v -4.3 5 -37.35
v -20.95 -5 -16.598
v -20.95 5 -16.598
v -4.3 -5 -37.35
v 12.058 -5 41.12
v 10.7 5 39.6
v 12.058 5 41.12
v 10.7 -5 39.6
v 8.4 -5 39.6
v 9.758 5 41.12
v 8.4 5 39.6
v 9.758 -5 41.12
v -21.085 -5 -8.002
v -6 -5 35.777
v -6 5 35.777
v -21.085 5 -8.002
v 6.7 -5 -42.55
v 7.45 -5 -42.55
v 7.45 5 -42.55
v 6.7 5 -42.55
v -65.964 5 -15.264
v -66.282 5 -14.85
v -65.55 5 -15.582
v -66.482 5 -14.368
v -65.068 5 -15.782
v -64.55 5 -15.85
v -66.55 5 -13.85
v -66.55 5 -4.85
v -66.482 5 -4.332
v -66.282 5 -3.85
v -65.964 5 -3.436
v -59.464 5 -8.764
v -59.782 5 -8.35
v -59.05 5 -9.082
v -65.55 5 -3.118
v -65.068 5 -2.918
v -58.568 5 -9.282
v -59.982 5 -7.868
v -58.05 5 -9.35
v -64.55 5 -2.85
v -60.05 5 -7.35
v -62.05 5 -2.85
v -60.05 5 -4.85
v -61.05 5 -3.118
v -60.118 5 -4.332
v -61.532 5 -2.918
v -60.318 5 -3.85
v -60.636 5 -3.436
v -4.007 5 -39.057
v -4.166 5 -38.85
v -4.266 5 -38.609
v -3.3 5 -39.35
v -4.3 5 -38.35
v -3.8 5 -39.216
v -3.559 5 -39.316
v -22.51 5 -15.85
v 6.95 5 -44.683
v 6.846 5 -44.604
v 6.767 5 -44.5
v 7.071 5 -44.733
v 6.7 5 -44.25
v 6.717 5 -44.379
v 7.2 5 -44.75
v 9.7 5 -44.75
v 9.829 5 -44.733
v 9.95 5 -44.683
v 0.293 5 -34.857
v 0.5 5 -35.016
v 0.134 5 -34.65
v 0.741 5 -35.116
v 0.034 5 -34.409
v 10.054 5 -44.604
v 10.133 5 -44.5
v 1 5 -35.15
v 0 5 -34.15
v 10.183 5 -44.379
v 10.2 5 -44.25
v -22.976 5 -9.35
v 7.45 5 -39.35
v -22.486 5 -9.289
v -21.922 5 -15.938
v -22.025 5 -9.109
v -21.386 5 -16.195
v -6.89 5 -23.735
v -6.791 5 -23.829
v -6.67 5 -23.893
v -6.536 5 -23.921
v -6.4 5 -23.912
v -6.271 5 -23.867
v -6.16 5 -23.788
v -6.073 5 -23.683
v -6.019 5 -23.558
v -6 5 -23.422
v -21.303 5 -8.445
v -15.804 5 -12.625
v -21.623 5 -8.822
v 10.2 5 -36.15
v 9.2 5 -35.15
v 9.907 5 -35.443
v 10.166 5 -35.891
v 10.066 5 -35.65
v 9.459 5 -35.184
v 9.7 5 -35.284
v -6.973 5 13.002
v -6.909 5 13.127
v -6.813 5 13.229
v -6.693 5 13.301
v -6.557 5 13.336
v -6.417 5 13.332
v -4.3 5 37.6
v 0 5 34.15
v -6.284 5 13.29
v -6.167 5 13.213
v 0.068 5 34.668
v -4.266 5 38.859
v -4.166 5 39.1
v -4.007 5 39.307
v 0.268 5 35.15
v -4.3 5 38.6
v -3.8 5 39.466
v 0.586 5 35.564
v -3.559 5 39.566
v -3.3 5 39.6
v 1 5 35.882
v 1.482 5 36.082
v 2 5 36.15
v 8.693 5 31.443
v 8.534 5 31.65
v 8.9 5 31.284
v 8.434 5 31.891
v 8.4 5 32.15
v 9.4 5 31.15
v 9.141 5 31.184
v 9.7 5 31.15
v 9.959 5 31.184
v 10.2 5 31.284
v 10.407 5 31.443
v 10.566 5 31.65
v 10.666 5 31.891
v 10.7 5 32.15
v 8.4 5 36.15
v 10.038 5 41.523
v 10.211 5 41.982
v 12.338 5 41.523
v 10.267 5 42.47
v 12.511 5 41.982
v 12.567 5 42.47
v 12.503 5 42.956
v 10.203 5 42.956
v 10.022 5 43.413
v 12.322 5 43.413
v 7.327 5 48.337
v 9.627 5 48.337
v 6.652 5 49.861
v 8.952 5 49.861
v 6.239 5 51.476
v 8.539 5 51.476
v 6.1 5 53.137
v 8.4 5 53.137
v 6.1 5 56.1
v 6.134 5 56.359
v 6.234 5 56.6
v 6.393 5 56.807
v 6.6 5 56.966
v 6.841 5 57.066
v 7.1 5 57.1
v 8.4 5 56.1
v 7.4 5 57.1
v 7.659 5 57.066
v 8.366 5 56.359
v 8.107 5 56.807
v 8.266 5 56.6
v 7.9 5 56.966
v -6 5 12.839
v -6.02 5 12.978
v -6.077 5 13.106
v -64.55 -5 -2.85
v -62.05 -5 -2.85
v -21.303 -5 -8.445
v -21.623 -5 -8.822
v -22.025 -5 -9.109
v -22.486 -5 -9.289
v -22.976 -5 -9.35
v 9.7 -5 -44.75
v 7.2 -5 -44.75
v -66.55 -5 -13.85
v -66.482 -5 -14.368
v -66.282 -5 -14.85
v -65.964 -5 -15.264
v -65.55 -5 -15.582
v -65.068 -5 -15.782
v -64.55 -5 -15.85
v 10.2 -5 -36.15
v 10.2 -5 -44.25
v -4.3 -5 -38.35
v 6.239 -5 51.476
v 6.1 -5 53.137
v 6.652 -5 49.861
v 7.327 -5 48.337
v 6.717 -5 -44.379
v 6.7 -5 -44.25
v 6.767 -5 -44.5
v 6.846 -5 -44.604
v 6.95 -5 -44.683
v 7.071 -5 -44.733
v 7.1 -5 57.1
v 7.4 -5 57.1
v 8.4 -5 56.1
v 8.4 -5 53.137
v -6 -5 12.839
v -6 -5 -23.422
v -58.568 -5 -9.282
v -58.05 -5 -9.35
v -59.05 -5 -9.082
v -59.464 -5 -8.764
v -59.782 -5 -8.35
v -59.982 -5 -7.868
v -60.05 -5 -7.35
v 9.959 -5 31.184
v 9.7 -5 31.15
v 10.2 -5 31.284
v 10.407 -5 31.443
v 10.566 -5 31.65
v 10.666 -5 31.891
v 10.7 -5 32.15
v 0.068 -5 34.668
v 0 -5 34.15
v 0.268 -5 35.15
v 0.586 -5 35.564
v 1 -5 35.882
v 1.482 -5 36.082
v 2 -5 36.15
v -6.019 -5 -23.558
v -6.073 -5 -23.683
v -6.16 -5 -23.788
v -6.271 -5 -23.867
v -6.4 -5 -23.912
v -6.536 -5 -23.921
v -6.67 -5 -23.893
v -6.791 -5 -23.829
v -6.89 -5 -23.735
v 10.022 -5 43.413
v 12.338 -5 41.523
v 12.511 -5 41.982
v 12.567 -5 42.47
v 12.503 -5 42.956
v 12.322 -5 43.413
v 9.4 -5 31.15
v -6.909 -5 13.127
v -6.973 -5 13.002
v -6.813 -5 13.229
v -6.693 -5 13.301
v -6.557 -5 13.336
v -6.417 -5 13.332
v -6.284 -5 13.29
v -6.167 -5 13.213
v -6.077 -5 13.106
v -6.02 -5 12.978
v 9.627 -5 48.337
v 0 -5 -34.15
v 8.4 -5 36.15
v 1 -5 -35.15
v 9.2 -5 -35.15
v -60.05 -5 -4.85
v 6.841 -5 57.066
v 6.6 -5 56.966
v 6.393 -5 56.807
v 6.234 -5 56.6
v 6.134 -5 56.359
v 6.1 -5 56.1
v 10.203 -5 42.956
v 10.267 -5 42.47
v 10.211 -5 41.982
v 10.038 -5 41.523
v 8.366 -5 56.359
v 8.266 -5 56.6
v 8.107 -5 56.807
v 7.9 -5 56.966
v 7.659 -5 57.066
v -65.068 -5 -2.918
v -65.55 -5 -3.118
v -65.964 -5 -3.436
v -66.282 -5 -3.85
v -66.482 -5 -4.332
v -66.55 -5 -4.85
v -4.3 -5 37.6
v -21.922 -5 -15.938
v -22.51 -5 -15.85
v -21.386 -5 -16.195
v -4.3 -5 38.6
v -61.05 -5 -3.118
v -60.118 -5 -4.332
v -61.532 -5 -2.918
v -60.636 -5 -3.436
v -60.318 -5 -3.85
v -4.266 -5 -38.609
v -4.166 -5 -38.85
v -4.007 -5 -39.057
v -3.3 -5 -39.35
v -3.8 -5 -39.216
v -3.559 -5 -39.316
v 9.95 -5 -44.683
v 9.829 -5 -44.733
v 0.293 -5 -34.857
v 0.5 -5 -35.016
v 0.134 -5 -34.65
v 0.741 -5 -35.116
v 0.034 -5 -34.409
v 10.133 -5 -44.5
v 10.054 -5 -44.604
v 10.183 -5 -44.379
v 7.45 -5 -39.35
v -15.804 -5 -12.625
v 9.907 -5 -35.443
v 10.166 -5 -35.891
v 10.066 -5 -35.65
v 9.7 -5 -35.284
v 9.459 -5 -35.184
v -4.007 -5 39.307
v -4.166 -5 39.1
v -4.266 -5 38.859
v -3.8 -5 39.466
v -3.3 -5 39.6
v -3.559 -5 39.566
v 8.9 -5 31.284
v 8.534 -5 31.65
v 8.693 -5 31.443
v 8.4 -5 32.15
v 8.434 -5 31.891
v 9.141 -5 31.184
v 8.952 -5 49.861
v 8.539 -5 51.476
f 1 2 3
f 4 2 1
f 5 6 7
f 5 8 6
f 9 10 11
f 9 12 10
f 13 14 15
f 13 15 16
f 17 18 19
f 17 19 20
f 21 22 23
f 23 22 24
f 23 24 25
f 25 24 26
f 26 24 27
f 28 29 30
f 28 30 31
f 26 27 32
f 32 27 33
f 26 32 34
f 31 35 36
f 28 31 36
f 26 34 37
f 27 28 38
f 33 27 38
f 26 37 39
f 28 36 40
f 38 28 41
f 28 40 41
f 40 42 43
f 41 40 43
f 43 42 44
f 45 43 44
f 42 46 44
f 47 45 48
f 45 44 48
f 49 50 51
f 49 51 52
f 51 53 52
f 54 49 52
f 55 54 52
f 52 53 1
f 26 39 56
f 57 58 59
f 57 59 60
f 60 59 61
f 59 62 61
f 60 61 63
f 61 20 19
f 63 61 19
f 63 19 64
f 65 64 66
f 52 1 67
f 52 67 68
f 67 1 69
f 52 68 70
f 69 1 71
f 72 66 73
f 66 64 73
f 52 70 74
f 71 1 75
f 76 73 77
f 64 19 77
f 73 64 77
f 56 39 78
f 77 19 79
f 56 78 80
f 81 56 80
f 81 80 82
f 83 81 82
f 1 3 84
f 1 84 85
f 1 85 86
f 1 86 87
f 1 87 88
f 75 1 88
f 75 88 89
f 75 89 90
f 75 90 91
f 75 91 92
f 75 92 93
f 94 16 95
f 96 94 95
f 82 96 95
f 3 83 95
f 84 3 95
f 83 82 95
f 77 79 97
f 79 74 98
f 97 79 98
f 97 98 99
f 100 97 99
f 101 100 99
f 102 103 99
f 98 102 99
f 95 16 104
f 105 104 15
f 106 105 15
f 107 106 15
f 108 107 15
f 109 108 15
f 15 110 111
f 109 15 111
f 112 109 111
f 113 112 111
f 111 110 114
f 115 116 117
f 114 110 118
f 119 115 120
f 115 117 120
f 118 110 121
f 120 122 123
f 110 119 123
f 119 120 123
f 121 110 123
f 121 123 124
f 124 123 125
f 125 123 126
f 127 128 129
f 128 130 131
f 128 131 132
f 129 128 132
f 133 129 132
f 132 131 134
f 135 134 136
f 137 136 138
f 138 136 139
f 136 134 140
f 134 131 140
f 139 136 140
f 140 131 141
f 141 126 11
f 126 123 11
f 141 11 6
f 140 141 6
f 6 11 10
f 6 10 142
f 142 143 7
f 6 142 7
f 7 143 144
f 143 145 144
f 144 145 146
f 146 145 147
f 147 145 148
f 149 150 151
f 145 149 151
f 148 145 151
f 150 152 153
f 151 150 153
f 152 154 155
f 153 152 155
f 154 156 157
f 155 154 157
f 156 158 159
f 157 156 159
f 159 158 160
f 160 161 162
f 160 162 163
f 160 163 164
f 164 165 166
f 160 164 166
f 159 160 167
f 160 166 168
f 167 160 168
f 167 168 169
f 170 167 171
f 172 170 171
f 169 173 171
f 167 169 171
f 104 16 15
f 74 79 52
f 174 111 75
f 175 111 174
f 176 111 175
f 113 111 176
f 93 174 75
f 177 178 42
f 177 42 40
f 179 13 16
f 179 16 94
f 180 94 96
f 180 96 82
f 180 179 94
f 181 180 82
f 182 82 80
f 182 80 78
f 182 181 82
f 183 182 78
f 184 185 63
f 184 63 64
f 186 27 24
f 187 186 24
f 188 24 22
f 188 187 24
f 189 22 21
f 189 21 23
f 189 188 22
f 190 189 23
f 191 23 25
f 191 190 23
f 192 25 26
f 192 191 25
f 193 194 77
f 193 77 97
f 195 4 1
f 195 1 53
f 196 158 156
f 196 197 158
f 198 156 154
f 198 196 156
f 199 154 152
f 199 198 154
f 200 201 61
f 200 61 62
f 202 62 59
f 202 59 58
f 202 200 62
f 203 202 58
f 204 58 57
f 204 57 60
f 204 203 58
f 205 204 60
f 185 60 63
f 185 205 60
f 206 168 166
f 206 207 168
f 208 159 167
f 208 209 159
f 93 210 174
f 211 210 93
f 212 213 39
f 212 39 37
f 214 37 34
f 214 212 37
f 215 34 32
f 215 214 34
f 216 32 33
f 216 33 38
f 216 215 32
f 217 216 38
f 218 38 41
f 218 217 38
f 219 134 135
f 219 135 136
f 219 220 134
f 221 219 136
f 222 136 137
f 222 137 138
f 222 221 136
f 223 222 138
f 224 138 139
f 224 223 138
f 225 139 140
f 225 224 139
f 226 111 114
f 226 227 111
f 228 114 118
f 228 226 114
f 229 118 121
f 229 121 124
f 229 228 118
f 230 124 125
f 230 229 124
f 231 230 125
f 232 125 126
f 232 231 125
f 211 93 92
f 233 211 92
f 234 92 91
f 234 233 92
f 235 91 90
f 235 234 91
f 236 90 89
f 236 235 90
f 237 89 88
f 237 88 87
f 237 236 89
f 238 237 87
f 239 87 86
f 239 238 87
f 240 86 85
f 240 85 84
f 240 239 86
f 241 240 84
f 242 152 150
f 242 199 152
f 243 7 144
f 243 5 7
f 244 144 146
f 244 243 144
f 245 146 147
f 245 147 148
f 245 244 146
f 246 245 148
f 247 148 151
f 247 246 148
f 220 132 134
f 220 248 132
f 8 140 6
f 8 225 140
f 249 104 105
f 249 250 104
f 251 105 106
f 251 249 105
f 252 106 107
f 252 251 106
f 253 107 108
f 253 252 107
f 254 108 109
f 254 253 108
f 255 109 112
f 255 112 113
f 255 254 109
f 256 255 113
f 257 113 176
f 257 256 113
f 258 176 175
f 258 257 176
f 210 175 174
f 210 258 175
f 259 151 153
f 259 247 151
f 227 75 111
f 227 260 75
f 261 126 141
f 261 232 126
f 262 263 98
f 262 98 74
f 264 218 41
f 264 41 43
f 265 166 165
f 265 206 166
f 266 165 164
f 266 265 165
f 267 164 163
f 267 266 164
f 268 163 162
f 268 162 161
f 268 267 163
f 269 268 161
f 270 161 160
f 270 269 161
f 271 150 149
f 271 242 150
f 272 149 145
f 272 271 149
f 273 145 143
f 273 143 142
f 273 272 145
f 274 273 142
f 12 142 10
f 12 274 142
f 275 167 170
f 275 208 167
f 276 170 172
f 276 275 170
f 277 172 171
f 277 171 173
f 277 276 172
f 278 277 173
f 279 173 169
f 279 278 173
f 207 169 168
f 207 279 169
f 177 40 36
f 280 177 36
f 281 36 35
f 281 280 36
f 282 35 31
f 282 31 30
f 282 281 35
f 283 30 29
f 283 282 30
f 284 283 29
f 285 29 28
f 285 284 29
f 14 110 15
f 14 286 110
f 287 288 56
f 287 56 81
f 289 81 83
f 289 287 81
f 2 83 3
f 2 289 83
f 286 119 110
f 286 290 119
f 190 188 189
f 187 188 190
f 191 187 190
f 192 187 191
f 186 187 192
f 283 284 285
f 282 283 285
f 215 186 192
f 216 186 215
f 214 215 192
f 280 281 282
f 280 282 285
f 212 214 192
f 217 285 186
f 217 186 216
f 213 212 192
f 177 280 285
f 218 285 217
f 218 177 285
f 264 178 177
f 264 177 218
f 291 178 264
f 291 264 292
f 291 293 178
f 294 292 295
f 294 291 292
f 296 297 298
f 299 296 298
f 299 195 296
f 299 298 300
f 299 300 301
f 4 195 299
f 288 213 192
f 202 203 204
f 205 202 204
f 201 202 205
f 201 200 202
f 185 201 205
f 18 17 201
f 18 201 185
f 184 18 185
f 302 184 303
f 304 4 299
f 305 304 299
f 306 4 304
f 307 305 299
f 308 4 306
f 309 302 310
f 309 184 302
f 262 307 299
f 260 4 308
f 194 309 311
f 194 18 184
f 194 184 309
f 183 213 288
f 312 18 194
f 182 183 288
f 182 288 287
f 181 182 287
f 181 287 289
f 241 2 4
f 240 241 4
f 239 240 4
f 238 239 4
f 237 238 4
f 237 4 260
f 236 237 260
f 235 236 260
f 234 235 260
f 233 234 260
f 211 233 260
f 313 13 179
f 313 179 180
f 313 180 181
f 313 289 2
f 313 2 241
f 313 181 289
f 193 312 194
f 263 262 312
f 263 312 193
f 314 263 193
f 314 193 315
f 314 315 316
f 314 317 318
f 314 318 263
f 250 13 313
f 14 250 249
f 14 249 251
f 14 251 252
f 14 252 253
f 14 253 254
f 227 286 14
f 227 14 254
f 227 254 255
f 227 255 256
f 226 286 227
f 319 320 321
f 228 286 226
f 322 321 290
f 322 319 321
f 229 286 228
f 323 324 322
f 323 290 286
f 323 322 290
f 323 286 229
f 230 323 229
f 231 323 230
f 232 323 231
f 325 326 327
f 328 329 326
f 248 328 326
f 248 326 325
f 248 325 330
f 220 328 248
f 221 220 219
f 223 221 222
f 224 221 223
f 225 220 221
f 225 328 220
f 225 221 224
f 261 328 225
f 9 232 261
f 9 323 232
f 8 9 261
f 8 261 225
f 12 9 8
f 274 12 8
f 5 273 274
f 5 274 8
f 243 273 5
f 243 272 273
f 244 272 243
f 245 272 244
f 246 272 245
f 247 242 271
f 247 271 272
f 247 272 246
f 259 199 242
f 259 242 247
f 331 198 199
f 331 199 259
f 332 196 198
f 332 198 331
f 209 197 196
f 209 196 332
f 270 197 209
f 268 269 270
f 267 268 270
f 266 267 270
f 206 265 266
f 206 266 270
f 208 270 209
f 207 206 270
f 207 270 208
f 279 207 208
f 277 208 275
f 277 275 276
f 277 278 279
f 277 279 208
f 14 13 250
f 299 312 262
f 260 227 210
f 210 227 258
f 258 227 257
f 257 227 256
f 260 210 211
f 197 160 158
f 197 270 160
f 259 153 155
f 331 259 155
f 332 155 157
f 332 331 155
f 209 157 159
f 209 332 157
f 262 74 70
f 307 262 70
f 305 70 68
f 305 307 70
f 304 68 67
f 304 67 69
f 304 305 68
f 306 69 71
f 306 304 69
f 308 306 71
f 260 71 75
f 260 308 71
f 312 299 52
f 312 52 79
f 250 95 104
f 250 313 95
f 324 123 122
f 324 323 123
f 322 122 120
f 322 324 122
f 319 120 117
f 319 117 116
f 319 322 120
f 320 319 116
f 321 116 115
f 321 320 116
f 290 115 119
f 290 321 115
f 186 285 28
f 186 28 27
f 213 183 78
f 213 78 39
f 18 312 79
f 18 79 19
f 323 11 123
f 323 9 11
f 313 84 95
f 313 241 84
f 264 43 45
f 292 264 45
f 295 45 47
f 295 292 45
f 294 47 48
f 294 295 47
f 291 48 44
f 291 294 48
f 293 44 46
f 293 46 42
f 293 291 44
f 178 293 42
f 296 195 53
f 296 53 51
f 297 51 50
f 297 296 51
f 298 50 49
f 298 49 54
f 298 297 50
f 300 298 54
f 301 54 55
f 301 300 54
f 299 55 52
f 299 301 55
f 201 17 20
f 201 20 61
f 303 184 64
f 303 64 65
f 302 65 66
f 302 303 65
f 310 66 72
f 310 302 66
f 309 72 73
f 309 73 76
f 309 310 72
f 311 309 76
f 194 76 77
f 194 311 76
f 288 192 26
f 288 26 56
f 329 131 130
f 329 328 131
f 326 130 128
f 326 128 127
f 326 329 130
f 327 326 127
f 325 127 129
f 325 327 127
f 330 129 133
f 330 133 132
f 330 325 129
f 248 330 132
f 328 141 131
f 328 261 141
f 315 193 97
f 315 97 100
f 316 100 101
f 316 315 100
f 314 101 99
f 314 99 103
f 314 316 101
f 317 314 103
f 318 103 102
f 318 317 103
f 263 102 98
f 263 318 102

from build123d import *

# Parameters (mm, degrees)
F1_DEPTH = 5


with BuildPart() as f1:
    # F0 (on Front) → F1 (new body, symmetric)
    with BuildSketch(Plane.XZ):
        with BuildLine():
            Line((-4.3, 37.6), (-6, 35.776973193))
            Line((-6, 35.776973193), (-21.085353054, -8.0015684709))
            ThreePointArc((-21.085353054, -8.0015684709), (-21.8150214993, -8.9783637404), (-22.9762413446, -9.35))
            Line((-22.9762413446, -9.35), (-58.05, -9.35))
            ThreePointArc((-58.05, -9.35), (-59.4642135624, -8.7642135624), (-60.05, -7.35))
            Line((-60.05, -7.35), (-60.05, -4.85))
            ThreePointArc((-60.05, -4.85), (-60.6357864376, -3.4357864376), (-62.05, -2.85))
            Line((-62.05, -2.85), (-64.55, -2.85))
            ThreePointArc((-64.55, -2.85), (-65.9642135624, -3.4357864376), (-66.55, -4.85))
            Line((-66.55, -4.85), (-66.55, -13.85))
            ThreePointArc((-66.55, -13.85), (-65.9642135624, -15.2642135624), (-64.55, -15.85))
            Line((-64.55, -15.85), (-22.5095066627, -15.85))
            ThreePointArc((-22.5095066627, -15.85), (-21.6444060516, -16.0467803981), (-20.9495402831, -16.5983990675))
            Line((-20.9495402831, -16.5983990675), (-4.3, -37.35))
            Line((-4.3, -37.35), (-4.3, -38.35))
            ThreePointArc((-4.3, -38.35), (-4.0071067812, -39.0571067812), (-3.3, -39.35))
            Line((-3.3, -39.35), (7.45, -39.35))
            Line((7.45, -39.35), (7.45, -42.55))
            Line((7.45, -42.55), (6.7, -42.55))
            Line((6.7, -42.55), (6.7, -44.25))
            ThreePointArc((6.7, -44.25), (6.8464466094, -44.6035533906), (7.2, -44.75))
            Line((7.2, -44.75), (9.7, -44.75))
            ThreePointArc((9.7, -44.75), (10.0535533906, -44.6035533906), (10.2, -44.25))
            Line((10.2, -44.25), (10.2, -36.15))
            ThreePointArc((10.2, -36.15), (9.9071067812, -35.4428932188), (9.2, -35.15))
            Line((9.2, -35.15), (1, -35.15))
            ThreePointArc((1, -35.15), (0.2928932188, -34.8571067812), (0, -34.15))
            Line((0, -34.15), (0, 34.15))
            ThreePointArc((0, 34.15), (0.5857864376, 35.5642135624), (2, 36.15))
            Line((2, 36.15), (8.4, 36.15))
            Line((8.4, 36.15), (8.4, 32.15))
            ThreePointArc((8.4, 32.15), (8.6928932188, 31.4428932188), (9.4, 31.15))
            Line((9.4, 31.15), (9.7, 31.15))
            ThreePointArc((9.7, 31.15), (10.4071067812, 31.4428932188), (10.7, 32.15))
            Line((10.7, 32.15), (10.7, 39.6))
            Line((10.7, 39.6), (12.0584372697, 41.1197607825))
            ThreePointArc((12.0584372697, 41.1197607825), (12.5542284753, 42.2243517405), (12.3218441058, 43.4125973417))
            Line((12.3218441058, 43.4125973417), (9.6272657122, 48.3374442137))
            ThreePointArc((9.6272657122, 48.3374442137), (8.7116734449, 50.6601925206), (8.4, 53.1373539124))
            Line((8.4, 53.1373539124), (8.4, 56.1))
            ThreePointArc((8.4, 56.1), (8.1071067812, 56.8071067812), (7.4, 57.1))
            Line((7.4, 57.1), (7.1, 57.1))
            ThreePointArc((7.1, 57.1), (6.3928932188, 56.8071067812), (6.1, 56.1))
            Line((6.1, 56.1), (6.1, 53.1373539124))
            ThreePointArc((6.1, 53.1373539124), (6.4116734449, 50.6601925206), (7.3272657122, 48.3374442137))
            Line((7.3272657122, 48.3374442137), (10.0218441058, 43.4125973417))
            ThreePointArc((10.0218441058, 43.4125973417), (10.2542284753, 42.2243517405), (9.7584372697, 41.1197607825))
            Line((9.7584372697, 41.1197607825), (8.4, 39.6))
            Line((8.4, 39.6), (-3.3, 39.6))
            ThreePointArc((-3.3, 39.6), (-4.0071067812, 39.3071067812), (-4.3, 38.6))
            Line((-4.3, 38.6), (-4.3, 37.6))
        make_face()
        with BuildLine():
            Line((-6, 12.8393314671), (-6, -23.4222970219))
            ThreePointArc((-6, -23.4222970219), (-6.334162425, -23.8939938512), (-6.8899915949, -23.7351972551))
            Line((-6.8899915949, -23.7351972551), (-15.8036005744, -12.6254817154))
            Line((-15.8036005744, -12.6254817154), (-6.9727220727, 13.0022235849))
            ThreePointArc((-6.9727220727, 13.0022235849), (-6.417419846, 13.3324648347), (-6, 12.8393314671))
        make_face(mode=Mode.SUBTRACT)
    extrude(amount=F1_DEPTH, both=True)


solid = f1.part
